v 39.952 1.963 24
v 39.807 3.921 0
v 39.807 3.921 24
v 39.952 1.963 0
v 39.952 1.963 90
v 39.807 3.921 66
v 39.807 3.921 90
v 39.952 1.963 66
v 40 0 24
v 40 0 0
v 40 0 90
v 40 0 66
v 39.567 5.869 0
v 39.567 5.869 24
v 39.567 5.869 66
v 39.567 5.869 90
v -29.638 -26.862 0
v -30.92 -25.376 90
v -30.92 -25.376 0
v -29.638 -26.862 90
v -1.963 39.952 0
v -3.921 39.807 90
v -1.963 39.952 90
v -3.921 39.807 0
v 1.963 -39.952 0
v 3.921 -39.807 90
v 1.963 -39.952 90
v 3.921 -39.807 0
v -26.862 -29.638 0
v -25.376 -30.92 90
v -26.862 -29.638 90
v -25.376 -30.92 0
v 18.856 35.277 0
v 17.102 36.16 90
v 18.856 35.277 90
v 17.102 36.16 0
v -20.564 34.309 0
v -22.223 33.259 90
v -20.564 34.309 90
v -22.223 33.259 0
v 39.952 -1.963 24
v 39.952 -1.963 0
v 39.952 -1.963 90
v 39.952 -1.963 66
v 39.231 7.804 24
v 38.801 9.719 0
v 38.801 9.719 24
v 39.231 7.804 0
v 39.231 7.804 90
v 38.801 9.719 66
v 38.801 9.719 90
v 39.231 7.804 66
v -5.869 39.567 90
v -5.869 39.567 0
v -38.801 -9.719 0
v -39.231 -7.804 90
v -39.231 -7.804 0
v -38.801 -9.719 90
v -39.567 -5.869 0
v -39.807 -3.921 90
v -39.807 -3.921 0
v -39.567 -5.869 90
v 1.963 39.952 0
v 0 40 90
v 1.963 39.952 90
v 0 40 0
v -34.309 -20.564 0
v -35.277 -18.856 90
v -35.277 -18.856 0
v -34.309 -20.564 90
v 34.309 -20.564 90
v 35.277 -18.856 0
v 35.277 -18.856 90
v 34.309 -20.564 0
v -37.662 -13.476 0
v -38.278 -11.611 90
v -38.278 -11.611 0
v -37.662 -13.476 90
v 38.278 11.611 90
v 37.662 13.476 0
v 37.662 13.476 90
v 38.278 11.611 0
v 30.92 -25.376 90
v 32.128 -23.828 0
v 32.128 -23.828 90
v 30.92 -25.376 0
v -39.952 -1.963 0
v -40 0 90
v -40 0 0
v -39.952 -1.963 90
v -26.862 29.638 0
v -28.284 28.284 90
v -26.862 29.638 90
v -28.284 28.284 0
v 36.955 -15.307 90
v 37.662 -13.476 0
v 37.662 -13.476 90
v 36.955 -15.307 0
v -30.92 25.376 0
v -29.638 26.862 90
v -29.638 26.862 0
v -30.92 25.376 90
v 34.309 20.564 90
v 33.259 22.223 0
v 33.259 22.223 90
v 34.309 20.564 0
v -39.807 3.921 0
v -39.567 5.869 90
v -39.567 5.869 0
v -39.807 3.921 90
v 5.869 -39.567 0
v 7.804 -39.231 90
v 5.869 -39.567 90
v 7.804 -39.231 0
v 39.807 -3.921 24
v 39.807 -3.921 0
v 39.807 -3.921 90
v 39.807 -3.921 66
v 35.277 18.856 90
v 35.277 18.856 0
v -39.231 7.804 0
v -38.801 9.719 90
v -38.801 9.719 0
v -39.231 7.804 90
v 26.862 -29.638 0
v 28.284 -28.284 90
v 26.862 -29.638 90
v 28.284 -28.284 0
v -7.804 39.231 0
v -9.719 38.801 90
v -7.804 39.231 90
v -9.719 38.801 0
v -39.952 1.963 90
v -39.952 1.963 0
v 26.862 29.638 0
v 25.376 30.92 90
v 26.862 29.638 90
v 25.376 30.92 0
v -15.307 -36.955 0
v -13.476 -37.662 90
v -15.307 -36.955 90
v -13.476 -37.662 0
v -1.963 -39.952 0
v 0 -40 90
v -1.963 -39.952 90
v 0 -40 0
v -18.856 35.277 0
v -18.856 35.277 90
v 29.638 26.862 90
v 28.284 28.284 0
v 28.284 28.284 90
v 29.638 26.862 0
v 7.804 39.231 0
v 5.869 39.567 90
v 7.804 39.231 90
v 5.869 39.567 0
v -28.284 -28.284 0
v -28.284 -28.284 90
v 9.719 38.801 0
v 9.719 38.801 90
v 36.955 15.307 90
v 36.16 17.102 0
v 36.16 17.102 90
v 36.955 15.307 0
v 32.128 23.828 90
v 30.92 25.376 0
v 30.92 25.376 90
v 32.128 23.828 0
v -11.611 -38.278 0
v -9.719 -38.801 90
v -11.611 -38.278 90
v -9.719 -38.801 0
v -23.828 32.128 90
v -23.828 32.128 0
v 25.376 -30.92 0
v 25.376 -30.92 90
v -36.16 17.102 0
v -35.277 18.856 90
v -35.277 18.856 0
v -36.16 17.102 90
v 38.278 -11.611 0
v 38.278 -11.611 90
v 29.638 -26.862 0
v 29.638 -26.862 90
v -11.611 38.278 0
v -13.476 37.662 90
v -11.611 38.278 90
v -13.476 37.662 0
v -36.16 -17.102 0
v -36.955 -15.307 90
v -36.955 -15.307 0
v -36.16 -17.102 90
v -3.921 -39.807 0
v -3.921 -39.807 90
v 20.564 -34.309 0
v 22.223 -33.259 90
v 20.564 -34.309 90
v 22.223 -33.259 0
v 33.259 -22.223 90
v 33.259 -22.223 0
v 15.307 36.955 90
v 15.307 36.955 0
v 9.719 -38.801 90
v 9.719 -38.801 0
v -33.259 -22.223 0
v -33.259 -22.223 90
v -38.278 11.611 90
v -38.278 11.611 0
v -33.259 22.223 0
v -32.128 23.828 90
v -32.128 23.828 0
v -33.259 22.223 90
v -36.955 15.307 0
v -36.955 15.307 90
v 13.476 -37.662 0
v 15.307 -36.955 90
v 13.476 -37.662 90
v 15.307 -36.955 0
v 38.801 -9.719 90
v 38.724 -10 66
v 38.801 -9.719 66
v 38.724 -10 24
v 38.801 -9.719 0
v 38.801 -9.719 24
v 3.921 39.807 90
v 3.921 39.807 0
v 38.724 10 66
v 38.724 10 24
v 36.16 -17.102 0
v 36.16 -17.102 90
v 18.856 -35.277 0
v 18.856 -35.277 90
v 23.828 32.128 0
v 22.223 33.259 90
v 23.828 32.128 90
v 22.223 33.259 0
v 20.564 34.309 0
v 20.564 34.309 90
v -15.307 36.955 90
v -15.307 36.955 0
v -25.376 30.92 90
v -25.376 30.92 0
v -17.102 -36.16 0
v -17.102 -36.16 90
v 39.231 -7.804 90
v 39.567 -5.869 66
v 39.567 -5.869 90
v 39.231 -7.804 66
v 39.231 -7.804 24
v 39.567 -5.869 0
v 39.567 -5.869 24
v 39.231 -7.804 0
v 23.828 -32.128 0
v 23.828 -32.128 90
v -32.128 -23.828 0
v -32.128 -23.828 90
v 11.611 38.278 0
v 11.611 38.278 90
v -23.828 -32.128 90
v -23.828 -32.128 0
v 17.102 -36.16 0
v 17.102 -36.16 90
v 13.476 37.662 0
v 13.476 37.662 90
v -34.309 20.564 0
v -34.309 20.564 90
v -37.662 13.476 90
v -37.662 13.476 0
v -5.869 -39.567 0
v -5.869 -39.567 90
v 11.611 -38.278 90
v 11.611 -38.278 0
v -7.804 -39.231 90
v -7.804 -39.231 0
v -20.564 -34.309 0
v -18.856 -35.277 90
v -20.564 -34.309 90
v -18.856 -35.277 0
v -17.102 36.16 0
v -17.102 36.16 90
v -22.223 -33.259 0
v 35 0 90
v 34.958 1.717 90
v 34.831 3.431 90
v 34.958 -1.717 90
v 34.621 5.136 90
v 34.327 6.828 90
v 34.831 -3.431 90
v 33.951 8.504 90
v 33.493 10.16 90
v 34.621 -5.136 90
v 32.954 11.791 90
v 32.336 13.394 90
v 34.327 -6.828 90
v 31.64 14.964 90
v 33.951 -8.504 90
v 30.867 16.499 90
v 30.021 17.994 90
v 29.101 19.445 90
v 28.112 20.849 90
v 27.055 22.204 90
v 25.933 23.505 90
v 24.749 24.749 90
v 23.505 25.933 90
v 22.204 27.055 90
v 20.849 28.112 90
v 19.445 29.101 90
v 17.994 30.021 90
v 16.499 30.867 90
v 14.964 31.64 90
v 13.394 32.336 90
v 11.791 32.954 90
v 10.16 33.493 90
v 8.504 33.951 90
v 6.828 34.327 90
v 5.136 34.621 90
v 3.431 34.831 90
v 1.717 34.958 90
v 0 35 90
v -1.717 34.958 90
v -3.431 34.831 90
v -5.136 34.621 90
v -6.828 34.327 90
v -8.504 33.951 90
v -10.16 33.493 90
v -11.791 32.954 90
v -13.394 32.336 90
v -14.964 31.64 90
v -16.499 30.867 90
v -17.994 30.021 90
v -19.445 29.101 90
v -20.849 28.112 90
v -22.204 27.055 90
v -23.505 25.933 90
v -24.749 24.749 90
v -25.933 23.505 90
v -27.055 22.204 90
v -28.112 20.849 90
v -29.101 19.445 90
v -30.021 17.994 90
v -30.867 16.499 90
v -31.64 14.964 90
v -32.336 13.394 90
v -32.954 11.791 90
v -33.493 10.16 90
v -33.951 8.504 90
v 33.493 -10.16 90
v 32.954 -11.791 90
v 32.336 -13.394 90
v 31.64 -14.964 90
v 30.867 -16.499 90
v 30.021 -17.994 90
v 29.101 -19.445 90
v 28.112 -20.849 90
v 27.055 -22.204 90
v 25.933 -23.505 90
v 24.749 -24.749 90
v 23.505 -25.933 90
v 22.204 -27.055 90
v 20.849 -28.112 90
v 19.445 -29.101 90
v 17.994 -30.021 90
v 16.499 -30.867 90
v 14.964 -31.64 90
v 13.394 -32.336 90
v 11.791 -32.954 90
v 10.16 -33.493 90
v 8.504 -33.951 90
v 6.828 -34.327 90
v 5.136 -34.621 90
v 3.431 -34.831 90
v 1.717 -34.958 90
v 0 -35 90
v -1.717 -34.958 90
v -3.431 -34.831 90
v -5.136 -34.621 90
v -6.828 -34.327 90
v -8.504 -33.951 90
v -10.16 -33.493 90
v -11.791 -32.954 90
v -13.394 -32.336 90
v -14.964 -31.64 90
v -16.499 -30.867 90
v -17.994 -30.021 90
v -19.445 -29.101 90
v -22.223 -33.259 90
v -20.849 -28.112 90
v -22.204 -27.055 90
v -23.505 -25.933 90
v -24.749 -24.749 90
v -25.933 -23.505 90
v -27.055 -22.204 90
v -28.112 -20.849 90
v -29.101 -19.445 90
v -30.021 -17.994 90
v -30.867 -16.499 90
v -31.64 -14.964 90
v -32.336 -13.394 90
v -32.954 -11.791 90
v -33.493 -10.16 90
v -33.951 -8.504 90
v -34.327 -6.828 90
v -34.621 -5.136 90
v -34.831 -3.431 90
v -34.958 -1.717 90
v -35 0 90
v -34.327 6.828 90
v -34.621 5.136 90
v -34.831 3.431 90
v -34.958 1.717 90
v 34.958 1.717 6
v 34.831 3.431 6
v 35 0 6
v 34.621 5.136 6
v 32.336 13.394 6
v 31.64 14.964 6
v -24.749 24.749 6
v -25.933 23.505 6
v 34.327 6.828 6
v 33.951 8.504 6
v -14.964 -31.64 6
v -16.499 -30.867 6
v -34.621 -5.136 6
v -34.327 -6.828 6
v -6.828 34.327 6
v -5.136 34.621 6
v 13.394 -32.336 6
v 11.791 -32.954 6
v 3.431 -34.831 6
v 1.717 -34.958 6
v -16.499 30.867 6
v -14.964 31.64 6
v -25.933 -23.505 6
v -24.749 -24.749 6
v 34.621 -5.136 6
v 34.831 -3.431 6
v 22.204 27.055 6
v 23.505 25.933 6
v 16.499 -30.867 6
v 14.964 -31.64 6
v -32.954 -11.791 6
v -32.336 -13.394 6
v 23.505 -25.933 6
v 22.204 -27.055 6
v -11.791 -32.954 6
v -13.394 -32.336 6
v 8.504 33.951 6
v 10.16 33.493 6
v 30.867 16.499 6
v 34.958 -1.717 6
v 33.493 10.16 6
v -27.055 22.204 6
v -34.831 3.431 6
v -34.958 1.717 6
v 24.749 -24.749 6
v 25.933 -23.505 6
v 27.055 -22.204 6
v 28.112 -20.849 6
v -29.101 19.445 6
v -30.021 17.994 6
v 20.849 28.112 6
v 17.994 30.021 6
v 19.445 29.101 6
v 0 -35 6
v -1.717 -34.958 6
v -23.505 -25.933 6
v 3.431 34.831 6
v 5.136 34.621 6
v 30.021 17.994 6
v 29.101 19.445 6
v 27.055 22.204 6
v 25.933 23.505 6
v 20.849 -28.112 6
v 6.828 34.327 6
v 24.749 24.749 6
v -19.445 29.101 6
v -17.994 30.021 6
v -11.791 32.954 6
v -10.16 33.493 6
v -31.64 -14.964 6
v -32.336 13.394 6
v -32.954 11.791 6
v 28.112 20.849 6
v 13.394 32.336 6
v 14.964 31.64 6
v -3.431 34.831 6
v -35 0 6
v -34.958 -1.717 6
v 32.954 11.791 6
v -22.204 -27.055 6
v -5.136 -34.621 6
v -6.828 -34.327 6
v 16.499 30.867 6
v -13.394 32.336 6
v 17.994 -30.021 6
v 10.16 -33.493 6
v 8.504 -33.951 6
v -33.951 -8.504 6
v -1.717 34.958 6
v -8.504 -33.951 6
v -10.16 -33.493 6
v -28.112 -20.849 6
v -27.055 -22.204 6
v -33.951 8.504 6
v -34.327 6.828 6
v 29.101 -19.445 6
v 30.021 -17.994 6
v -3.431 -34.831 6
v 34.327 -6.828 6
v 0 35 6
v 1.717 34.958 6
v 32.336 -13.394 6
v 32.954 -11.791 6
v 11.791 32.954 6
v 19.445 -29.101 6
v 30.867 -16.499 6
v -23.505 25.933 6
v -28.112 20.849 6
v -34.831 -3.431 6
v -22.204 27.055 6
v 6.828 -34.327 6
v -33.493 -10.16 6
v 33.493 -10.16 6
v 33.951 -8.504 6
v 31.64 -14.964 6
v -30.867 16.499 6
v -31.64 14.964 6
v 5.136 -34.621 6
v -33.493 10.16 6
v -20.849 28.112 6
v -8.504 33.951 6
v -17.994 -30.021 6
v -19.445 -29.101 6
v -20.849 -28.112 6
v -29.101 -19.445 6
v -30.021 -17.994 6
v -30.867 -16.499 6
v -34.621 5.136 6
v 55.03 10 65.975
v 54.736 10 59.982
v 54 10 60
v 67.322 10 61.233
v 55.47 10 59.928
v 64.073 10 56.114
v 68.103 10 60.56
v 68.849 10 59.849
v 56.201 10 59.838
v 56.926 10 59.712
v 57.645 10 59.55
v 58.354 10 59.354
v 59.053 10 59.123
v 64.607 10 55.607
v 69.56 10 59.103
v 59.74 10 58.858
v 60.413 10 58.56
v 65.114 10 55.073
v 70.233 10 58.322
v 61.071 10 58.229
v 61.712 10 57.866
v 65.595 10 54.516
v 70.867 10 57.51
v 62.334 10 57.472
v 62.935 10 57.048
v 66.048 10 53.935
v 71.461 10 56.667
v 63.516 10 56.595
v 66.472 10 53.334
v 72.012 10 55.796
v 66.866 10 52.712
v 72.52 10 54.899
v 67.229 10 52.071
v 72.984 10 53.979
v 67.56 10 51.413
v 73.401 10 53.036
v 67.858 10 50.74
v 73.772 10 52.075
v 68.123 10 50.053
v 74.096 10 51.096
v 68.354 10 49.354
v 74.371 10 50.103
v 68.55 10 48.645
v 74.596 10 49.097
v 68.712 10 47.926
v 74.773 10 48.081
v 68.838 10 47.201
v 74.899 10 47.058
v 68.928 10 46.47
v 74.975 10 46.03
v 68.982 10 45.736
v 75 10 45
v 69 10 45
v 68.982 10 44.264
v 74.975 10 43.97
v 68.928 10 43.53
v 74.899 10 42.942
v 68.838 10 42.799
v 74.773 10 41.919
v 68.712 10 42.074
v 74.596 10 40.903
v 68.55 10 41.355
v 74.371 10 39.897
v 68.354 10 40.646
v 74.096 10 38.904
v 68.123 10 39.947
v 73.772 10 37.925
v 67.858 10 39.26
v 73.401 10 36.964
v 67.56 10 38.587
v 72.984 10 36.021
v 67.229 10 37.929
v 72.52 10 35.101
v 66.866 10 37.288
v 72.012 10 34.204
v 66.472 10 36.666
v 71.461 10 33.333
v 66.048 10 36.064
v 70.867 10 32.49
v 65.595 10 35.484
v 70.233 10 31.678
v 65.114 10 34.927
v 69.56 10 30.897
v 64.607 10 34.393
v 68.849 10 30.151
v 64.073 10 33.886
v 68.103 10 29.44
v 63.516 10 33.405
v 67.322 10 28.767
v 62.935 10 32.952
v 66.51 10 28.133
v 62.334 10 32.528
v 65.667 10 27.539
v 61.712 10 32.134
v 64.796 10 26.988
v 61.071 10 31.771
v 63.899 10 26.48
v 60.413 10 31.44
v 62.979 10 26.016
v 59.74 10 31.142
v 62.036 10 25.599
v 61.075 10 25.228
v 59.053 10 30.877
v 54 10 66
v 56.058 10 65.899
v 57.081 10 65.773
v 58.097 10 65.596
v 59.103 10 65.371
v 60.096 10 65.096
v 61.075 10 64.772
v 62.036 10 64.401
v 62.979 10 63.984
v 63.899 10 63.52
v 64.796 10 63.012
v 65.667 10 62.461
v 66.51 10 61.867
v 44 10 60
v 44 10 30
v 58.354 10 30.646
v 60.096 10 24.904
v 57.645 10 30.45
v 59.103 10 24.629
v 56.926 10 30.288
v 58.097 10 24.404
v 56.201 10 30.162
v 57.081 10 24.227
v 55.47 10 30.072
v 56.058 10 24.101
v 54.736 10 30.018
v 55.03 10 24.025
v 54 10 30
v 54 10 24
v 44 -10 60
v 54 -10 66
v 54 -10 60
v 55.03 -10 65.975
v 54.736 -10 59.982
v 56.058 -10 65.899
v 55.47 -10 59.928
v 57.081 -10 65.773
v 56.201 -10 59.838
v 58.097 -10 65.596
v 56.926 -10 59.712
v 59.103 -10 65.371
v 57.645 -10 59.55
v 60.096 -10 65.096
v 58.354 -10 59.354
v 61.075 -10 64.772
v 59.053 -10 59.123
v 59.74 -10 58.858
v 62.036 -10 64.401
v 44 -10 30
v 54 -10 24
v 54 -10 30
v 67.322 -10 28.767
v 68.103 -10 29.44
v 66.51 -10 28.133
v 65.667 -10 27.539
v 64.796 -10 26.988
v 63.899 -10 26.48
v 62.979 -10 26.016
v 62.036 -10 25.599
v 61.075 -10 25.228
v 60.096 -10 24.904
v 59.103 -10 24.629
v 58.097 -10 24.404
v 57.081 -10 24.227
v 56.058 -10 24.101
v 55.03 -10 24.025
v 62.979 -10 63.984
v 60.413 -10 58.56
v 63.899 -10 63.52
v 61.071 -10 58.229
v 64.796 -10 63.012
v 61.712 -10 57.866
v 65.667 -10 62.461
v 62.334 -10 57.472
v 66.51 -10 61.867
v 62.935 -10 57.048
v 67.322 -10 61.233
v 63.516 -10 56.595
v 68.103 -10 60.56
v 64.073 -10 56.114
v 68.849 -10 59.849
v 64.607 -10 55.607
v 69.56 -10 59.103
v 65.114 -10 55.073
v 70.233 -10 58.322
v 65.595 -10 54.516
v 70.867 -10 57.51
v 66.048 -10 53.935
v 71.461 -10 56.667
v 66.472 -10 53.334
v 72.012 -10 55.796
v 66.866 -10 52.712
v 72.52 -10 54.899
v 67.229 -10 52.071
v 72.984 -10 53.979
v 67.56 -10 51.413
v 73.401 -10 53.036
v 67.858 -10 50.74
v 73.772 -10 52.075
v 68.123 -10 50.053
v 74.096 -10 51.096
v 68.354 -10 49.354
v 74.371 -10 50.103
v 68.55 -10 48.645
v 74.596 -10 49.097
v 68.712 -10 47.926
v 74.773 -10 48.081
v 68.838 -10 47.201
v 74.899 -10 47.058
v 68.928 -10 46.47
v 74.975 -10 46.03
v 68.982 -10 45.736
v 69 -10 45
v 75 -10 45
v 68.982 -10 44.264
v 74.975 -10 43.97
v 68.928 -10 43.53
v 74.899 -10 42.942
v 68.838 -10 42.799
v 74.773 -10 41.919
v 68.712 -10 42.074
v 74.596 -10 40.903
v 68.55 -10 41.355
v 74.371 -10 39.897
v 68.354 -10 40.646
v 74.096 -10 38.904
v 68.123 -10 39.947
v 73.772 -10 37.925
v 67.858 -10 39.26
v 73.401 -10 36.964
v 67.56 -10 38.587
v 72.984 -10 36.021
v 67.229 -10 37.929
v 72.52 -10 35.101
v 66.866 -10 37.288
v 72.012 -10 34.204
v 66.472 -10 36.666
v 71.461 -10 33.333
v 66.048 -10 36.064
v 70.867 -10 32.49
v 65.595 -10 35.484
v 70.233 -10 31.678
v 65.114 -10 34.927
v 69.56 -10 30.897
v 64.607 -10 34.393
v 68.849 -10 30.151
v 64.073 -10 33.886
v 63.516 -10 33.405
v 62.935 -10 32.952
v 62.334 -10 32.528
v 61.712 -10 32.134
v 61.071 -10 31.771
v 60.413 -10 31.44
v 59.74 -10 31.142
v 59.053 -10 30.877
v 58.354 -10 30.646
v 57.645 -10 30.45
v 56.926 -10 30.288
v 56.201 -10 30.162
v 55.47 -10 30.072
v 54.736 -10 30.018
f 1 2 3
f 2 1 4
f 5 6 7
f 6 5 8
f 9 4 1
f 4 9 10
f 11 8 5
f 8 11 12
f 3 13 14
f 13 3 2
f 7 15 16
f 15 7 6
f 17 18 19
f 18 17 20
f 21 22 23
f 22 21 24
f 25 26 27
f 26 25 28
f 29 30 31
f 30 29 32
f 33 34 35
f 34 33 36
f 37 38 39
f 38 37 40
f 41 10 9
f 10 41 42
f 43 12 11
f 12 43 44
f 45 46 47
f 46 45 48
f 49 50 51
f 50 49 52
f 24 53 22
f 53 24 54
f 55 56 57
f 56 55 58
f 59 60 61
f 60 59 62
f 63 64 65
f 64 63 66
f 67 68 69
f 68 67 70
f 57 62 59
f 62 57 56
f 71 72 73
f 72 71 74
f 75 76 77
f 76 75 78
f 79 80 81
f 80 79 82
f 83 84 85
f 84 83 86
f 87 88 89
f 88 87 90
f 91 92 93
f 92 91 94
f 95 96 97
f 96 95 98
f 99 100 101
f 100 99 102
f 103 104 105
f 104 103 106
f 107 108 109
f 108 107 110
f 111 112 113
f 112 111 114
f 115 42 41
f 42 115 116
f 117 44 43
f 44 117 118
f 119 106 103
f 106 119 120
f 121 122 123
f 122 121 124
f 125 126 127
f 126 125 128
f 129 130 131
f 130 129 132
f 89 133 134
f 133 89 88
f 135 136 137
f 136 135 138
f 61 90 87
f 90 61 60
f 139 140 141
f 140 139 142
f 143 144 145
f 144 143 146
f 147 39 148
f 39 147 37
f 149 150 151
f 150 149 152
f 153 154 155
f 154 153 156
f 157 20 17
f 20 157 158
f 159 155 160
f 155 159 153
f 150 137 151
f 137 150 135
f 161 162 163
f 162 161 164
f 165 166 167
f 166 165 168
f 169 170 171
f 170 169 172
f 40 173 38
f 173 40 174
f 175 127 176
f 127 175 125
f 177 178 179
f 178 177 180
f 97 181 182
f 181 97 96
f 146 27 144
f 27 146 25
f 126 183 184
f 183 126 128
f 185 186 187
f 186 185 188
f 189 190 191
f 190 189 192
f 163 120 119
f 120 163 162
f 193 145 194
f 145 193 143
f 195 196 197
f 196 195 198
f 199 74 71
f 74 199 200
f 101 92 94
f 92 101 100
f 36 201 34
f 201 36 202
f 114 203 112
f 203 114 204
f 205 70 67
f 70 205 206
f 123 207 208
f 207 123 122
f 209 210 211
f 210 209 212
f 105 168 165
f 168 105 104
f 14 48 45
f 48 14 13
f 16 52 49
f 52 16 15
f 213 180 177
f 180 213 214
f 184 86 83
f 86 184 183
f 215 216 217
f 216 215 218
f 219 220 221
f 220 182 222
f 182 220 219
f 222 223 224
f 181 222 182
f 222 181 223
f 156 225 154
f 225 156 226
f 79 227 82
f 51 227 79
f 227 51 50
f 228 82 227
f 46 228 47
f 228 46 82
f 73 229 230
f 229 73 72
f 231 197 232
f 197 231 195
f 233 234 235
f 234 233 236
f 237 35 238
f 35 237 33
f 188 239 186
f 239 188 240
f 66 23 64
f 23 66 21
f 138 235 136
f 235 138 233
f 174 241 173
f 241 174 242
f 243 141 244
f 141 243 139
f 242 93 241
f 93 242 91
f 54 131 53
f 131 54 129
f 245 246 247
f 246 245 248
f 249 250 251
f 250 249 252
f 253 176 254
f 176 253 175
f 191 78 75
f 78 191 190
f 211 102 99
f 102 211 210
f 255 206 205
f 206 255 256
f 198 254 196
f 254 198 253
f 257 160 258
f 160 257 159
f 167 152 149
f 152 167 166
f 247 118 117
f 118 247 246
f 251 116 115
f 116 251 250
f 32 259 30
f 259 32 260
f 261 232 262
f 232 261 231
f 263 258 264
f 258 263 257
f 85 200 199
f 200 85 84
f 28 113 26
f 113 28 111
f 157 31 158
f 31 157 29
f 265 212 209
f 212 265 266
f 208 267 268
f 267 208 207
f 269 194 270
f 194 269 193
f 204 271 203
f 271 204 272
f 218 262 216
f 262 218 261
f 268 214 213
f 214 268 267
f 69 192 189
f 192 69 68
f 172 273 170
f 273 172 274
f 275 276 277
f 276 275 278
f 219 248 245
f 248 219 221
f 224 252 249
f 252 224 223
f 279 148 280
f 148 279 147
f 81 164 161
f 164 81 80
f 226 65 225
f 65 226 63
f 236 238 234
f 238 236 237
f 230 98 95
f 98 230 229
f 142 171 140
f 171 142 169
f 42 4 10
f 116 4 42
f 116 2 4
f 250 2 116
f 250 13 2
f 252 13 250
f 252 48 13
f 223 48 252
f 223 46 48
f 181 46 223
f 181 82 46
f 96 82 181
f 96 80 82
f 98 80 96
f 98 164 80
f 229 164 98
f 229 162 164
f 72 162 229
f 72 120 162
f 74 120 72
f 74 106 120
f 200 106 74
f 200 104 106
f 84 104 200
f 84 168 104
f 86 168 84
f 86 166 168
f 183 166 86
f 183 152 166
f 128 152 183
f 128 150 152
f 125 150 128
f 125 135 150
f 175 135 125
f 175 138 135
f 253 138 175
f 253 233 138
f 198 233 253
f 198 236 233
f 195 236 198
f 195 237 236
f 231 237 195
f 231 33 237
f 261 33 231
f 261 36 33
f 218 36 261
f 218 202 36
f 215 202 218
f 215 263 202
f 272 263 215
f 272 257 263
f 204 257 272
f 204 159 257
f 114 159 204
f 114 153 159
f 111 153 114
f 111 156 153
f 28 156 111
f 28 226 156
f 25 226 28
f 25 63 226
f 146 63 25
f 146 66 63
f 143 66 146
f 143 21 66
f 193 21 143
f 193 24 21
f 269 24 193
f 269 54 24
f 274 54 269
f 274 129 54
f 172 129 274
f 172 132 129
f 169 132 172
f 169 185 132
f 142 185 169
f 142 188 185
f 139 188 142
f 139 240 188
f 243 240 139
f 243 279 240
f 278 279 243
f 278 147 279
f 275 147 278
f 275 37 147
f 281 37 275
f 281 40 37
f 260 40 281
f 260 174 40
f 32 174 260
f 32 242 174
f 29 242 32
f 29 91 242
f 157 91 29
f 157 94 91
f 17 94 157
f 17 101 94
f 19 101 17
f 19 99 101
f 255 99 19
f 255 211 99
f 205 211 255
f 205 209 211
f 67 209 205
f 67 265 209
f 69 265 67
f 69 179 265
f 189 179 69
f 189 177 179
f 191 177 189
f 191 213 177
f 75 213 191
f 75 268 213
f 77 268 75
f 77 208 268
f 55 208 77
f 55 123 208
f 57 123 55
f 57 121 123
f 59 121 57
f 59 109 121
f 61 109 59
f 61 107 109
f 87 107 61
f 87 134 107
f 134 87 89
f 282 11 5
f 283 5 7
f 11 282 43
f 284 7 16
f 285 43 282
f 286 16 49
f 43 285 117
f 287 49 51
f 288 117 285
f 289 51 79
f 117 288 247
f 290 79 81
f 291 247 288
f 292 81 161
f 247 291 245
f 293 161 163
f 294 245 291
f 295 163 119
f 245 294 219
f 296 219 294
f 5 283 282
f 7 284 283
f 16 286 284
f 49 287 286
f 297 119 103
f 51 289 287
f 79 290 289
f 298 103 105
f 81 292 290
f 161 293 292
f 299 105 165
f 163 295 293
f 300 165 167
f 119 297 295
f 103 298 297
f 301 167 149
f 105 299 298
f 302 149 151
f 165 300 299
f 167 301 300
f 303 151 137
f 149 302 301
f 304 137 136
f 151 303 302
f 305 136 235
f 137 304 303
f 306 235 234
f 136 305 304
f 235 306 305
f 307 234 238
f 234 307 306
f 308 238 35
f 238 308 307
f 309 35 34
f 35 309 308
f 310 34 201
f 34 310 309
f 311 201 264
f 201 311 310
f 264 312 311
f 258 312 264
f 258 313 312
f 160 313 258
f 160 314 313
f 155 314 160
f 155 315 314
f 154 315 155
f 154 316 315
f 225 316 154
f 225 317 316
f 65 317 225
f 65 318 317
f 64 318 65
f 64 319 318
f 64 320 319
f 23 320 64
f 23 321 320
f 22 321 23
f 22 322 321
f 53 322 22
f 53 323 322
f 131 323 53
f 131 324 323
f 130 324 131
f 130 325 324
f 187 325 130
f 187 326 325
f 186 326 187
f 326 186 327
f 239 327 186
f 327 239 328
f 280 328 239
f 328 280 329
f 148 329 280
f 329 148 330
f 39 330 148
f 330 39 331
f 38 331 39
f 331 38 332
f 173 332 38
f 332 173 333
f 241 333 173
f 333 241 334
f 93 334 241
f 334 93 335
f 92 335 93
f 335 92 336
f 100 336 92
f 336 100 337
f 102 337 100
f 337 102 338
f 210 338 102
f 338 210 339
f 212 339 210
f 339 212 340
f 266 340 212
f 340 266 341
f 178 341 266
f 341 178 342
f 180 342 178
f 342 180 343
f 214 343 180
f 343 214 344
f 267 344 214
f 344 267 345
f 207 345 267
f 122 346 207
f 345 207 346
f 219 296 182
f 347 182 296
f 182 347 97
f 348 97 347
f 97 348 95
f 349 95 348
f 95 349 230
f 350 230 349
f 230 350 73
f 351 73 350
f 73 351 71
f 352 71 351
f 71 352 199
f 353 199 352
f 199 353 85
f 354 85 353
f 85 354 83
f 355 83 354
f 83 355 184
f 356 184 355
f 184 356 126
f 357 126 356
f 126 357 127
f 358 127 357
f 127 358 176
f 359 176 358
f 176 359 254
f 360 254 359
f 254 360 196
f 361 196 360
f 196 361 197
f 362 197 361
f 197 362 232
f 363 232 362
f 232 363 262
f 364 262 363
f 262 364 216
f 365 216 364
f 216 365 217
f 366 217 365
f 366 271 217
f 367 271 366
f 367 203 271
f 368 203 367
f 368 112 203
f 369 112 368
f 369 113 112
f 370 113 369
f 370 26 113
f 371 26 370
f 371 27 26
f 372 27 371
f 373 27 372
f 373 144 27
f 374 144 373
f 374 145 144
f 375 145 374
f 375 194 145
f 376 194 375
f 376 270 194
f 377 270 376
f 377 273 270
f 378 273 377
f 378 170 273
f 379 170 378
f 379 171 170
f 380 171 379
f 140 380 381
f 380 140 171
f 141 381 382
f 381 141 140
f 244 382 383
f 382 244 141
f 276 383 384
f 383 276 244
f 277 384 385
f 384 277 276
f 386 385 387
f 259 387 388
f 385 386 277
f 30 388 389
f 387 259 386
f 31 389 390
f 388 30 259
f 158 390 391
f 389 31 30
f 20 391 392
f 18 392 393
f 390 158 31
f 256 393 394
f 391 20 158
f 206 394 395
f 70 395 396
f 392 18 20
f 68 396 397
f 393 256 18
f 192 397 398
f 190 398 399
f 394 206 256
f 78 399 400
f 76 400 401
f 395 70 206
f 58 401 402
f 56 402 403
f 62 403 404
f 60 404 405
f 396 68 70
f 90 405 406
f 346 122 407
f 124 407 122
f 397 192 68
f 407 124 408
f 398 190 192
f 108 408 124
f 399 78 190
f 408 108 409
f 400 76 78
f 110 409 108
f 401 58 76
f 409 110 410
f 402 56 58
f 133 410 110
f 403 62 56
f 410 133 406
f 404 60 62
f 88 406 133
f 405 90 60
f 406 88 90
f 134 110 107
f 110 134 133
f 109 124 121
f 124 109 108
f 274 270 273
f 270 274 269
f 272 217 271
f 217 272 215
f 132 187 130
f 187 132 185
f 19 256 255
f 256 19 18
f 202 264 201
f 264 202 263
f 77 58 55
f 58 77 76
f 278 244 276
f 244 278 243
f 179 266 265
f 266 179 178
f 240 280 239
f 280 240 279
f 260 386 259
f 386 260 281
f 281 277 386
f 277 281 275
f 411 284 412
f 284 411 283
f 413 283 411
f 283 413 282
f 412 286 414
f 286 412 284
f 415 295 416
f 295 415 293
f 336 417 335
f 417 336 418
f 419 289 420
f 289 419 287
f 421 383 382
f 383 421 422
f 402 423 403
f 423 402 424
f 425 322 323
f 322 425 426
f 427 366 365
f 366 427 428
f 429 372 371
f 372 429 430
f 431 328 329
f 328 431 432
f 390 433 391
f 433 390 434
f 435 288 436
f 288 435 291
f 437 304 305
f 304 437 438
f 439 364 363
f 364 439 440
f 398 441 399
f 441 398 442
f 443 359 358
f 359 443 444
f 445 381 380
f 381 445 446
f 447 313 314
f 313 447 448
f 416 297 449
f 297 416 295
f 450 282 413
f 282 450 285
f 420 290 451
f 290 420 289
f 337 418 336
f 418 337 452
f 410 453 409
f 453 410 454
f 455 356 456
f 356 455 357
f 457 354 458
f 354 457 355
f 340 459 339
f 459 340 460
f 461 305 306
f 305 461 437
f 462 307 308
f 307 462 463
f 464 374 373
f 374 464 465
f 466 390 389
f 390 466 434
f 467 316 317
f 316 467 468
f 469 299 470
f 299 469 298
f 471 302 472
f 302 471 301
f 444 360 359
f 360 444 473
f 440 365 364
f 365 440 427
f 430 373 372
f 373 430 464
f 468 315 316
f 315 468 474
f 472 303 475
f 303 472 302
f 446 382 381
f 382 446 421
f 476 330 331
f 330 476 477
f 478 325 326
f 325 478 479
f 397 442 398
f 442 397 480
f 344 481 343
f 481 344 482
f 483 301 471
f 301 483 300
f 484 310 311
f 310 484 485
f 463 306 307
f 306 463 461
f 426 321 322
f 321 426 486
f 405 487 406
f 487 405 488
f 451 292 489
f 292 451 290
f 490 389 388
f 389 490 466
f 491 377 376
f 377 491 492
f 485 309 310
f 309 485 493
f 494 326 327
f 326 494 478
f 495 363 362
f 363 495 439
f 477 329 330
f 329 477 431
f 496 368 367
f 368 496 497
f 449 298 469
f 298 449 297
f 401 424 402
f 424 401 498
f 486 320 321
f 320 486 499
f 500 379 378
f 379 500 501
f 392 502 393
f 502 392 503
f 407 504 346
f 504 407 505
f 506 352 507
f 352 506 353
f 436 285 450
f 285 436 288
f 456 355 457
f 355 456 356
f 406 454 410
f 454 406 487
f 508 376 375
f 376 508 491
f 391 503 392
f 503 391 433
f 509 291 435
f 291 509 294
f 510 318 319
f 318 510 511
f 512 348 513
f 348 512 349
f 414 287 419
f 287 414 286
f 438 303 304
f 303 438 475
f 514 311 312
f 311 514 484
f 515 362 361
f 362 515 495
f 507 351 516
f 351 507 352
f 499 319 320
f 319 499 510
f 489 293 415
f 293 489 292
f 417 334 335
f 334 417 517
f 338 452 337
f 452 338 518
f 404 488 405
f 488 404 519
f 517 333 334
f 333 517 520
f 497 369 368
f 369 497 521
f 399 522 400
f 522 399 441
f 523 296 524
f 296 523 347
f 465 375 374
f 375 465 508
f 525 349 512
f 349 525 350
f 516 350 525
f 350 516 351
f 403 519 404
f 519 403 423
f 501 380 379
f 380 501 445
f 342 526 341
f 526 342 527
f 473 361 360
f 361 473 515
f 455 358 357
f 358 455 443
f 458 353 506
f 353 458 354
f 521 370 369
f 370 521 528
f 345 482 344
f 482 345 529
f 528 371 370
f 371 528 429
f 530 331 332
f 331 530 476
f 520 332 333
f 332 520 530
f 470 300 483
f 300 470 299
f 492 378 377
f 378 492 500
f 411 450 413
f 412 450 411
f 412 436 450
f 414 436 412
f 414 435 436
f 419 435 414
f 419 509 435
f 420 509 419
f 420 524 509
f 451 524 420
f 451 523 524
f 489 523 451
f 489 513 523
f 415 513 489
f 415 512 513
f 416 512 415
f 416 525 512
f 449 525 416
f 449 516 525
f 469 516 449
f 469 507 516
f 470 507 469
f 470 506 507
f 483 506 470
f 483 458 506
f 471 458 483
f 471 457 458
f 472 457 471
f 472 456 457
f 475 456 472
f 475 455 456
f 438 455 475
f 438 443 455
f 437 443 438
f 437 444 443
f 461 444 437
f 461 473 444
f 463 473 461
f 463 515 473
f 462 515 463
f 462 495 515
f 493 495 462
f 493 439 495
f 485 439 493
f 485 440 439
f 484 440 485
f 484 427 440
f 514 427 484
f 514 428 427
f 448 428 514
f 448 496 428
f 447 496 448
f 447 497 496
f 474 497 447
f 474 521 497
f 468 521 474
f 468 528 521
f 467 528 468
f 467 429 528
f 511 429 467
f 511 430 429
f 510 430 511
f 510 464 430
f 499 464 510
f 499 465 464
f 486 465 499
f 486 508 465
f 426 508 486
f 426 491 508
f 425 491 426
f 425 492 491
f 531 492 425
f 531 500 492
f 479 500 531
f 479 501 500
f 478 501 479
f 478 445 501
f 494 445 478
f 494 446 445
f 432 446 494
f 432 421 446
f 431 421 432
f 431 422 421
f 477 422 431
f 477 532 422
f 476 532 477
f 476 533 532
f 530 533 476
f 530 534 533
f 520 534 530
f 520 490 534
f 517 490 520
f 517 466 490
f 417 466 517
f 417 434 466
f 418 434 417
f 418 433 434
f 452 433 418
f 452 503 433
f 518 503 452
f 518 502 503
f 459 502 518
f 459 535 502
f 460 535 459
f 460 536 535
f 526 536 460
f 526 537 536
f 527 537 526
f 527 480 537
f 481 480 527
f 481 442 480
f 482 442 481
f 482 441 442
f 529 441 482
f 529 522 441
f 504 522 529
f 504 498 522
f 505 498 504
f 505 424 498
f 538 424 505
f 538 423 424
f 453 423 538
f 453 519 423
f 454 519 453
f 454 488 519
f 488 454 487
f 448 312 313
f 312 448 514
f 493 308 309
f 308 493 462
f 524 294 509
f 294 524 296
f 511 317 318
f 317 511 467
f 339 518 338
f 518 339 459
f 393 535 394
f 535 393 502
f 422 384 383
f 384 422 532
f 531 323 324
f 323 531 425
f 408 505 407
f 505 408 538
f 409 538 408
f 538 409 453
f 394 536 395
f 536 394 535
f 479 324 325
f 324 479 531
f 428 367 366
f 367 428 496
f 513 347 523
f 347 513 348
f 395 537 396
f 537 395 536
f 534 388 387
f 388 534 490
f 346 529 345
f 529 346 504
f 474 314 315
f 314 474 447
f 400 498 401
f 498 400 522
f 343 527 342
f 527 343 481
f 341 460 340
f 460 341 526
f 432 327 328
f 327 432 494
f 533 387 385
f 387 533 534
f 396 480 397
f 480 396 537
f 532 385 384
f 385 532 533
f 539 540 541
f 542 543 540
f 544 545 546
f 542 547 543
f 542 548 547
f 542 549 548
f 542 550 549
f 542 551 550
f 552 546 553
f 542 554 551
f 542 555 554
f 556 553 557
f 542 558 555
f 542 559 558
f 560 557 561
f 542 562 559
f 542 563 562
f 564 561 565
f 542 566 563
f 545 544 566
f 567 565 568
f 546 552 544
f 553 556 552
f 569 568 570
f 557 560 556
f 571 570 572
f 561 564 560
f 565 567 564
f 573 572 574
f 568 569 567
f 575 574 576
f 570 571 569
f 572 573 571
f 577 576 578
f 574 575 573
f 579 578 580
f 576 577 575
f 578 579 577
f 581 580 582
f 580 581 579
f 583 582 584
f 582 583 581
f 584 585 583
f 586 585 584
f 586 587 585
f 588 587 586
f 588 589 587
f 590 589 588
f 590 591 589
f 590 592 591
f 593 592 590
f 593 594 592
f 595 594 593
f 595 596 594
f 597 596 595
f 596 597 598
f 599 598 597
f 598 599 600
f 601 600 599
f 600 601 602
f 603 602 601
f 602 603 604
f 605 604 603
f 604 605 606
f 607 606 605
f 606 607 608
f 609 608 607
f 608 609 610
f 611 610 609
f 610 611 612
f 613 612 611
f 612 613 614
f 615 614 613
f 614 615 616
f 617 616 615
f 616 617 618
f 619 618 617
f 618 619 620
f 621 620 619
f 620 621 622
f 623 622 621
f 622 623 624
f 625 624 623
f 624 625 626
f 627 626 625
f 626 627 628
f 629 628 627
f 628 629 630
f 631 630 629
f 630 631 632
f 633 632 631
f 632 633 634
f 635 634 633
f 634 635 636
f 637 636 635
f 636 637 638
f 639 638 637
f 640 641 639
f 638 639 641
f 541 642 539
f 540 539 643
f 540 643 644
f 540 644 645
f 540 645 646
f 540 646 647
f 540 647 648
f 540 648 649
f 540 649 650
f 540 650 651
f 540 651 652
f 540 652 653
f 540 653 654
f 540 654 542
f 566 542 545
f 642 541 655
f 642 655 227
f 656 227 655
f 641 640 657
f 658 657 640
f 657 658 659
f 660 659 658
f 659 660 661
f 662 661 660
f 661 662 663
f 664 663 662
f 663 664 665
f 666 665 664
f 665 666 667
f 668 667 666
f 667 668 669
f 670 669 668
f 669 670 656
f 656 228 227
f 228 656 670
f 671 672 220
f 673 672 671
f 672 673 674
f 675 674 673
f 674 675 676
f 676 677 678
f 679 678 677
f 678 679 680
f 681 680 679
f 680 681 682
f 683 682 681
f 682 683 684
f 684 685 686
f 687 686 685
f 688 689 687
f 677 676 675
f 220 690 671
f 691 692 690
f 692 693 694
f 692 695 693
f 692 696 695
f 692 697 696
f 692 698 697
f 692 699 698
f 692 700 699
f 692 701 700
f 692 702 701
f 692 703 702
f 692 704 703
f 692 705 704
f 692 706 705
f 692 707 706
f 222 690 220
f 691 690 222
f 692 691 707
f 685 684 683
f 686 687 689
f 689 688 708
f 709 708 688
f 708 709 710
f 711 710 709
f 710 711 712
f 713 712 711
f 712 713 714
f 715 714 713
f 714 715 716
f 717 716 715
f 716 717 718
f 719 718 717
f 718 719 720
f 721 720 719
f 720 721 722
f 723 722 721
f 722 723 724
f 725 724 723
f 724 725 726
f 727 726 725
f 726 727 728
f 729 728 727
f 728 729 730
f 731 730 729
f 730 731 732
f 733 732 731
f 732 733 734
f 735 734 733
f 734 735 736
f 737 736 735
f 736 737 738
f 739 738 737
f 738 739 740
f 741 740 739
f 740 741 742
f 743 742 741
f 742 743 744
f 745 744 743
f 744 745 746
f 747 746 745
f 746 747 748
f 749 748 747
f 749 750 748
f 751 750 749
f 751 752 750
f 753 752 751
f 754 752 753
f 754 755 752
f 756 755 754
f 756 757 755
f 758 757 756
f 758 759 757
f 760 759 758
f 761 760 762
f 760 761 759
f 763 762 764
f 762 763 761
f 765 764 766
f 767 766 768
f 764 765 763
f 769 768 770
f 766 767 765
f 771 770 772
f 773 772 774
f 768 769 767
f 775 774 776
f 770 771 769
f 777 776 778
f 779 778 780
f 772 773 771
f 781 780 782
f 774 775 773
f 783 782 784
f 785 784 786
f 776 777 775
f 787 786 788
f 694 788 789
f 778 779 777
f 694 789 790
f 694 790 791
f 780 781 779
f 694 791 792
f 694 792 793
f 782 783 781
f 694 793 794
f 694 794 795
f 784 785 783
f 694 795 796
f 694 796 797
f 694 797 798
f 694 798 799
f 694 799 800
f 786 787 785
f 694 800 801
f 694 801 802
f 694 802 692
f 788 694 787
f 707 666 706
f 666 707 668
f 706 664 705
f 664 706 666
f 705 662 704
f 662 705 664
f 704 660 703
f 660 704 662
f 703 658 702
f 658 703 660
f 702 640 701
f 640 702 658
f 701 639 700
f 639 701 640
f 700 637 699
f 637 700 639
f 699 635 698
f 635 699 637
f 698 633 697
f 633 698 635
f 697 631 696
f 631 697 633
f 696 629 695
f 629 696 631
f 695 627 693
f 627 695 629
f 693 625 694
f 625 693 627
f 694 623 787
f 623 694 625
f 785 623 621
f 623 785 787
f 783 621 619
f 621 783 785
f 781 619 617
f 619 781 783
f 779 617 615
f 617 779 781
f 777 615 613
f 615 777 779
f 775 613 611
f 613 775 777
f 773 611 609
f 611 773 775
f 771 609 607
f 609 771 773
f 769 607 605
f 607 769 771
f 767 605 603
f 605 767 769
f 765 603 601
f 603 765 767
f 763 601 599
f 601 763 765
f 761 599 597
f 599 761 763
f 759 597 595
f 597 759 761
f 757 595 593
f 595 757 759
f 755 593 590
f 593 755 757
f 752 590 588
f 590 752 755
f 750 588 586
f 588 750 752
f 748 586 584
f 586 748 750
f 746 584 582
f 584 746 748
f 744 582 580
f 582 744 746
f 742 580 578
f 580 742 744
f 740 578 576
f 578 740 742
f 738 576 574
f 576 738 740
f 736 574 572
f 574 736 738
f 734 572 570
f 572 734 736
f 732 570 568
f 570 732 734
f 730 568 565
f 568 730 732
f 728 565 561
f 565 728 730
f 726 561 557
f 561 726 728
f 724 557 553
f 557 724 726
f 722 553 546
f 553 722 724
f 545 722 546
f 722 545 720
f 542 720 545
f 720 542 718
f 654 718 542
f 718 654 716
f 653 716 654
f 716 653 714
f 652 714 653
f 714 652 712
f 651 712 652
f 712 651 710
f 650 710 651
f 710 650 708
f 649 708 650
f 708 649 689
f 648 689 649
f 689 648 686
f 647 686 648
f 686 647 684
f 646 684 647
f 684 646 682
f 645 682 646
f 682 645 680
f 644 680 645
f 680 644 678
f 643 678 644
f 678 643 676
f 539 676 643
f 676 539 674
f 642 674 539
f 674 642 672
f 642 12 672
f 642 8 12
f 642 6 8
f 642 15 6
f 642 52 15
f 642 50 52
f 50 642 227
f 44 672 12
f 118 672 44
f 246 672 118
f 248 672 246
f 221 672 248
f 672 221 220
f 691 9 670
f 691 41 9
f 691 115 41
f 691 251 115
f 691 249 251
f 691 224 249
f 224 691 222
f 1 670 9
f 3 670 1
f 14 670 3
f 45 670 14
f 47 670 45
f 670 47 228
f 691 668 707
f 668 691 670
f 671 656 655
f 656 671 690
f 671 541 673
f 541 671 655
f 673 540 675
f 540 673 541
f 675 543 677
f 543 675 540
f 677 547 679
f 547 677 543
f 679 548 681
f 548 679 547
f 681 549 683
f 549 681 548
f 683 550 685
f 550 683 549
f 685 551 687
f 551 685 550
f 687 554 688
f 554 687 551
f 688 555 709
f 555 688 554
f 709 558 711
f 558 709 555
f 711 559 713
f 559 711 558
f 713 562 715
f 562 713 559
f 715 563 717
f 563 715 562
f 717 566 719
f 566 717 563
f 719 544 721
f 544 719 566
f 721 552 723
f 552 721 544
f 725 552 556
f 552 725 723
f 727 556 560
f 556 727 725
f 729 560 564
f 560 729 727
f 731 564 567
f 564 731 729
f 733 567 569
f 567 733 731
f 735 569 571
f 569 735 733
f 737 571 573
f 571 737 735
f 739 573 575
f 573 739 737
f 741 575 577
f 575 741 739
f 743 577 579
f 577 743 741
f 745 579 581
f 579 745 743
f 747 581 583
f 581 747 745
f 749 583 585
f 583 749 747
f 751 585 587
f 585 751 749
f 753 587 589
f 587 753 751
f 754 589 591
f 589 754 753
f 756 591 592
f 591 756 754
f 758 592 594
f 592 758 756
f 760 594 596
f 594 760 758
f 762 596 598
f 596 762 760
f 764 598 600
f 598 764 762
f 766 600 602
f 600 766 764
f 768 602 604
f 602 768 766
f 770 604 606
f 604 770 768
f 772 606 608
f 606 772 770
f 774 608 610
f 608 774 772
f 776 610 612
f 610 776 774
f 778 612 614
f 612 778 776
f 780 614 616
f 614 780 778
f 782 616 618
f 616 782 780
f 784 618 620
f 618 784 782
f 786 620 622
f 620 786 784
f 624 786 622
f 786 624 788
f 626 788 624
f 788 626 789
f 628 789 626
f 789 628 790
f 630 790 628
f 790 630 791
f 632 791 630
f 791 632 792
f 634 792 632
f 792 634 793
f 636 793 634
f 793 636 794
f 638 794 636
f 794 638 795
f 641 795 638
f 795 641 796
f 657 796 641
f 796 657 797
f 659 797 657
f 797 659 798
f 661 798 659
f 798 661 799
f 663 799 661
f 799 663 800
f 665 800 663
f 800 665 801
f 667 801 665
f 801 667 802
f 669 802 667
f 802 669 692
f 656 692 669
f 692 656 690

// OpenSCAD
$fn = 128;

mug_outer_radius = 40;
mug_inner_radius = 35;
mug_height = 90;
mug_bottom_thickness = 6;
inner_fudge = 0.2;

handle_inner_height = 30;
handle_inner_width = 25;
handle_wall_thickness = 6;
handle_depth = 20;
handle_overlap = 2;

module d_outline(straight_len, radius) {
    union() {
        square([straight_len, 2 * radius], center = false);
        intersection() {
            translate([straight_len, radius])
                circle(r = radius);
            translate([straight_len, 0])
                square([radius, 2 * radius], center = false);
        }
    }
}

module mug_body() {
    difference() {
        cylinder(h = mug_height, r = mug_outer_radius);
        translate([0, 0, mug_bottom_thickness])
            cylinder(h = mug_height - mug_bottom_thickness + inner_fudge, r = mug_inner_radius);
    }
}

module handle() {
    inner_radius = handle_inner_height / 2;
    outer_radius = inner_radius + handle_wall_thickness;
    straight_inner = max(0, handle_inner_width - inner_radius);
    straight_outer = straight_inner + handle_wall_thickness;

    translate([mug_outer_radius - handle_overlap, 0, mug_height / 2])
        rotate([90, 0, 0])
            linear_extrude(height = handle_depth, center = true, convexity = 10)
                translate([0, -outer_radius])
                    difference() {
                        d_outline(straight_outer, outer_radius);
                        translate([handle_wall_thickness, handle_wall_thickness])
                            d_outline(straight_inner, inner_radius);
                    };
}

union() {
    mug_body();
    handle();
}
